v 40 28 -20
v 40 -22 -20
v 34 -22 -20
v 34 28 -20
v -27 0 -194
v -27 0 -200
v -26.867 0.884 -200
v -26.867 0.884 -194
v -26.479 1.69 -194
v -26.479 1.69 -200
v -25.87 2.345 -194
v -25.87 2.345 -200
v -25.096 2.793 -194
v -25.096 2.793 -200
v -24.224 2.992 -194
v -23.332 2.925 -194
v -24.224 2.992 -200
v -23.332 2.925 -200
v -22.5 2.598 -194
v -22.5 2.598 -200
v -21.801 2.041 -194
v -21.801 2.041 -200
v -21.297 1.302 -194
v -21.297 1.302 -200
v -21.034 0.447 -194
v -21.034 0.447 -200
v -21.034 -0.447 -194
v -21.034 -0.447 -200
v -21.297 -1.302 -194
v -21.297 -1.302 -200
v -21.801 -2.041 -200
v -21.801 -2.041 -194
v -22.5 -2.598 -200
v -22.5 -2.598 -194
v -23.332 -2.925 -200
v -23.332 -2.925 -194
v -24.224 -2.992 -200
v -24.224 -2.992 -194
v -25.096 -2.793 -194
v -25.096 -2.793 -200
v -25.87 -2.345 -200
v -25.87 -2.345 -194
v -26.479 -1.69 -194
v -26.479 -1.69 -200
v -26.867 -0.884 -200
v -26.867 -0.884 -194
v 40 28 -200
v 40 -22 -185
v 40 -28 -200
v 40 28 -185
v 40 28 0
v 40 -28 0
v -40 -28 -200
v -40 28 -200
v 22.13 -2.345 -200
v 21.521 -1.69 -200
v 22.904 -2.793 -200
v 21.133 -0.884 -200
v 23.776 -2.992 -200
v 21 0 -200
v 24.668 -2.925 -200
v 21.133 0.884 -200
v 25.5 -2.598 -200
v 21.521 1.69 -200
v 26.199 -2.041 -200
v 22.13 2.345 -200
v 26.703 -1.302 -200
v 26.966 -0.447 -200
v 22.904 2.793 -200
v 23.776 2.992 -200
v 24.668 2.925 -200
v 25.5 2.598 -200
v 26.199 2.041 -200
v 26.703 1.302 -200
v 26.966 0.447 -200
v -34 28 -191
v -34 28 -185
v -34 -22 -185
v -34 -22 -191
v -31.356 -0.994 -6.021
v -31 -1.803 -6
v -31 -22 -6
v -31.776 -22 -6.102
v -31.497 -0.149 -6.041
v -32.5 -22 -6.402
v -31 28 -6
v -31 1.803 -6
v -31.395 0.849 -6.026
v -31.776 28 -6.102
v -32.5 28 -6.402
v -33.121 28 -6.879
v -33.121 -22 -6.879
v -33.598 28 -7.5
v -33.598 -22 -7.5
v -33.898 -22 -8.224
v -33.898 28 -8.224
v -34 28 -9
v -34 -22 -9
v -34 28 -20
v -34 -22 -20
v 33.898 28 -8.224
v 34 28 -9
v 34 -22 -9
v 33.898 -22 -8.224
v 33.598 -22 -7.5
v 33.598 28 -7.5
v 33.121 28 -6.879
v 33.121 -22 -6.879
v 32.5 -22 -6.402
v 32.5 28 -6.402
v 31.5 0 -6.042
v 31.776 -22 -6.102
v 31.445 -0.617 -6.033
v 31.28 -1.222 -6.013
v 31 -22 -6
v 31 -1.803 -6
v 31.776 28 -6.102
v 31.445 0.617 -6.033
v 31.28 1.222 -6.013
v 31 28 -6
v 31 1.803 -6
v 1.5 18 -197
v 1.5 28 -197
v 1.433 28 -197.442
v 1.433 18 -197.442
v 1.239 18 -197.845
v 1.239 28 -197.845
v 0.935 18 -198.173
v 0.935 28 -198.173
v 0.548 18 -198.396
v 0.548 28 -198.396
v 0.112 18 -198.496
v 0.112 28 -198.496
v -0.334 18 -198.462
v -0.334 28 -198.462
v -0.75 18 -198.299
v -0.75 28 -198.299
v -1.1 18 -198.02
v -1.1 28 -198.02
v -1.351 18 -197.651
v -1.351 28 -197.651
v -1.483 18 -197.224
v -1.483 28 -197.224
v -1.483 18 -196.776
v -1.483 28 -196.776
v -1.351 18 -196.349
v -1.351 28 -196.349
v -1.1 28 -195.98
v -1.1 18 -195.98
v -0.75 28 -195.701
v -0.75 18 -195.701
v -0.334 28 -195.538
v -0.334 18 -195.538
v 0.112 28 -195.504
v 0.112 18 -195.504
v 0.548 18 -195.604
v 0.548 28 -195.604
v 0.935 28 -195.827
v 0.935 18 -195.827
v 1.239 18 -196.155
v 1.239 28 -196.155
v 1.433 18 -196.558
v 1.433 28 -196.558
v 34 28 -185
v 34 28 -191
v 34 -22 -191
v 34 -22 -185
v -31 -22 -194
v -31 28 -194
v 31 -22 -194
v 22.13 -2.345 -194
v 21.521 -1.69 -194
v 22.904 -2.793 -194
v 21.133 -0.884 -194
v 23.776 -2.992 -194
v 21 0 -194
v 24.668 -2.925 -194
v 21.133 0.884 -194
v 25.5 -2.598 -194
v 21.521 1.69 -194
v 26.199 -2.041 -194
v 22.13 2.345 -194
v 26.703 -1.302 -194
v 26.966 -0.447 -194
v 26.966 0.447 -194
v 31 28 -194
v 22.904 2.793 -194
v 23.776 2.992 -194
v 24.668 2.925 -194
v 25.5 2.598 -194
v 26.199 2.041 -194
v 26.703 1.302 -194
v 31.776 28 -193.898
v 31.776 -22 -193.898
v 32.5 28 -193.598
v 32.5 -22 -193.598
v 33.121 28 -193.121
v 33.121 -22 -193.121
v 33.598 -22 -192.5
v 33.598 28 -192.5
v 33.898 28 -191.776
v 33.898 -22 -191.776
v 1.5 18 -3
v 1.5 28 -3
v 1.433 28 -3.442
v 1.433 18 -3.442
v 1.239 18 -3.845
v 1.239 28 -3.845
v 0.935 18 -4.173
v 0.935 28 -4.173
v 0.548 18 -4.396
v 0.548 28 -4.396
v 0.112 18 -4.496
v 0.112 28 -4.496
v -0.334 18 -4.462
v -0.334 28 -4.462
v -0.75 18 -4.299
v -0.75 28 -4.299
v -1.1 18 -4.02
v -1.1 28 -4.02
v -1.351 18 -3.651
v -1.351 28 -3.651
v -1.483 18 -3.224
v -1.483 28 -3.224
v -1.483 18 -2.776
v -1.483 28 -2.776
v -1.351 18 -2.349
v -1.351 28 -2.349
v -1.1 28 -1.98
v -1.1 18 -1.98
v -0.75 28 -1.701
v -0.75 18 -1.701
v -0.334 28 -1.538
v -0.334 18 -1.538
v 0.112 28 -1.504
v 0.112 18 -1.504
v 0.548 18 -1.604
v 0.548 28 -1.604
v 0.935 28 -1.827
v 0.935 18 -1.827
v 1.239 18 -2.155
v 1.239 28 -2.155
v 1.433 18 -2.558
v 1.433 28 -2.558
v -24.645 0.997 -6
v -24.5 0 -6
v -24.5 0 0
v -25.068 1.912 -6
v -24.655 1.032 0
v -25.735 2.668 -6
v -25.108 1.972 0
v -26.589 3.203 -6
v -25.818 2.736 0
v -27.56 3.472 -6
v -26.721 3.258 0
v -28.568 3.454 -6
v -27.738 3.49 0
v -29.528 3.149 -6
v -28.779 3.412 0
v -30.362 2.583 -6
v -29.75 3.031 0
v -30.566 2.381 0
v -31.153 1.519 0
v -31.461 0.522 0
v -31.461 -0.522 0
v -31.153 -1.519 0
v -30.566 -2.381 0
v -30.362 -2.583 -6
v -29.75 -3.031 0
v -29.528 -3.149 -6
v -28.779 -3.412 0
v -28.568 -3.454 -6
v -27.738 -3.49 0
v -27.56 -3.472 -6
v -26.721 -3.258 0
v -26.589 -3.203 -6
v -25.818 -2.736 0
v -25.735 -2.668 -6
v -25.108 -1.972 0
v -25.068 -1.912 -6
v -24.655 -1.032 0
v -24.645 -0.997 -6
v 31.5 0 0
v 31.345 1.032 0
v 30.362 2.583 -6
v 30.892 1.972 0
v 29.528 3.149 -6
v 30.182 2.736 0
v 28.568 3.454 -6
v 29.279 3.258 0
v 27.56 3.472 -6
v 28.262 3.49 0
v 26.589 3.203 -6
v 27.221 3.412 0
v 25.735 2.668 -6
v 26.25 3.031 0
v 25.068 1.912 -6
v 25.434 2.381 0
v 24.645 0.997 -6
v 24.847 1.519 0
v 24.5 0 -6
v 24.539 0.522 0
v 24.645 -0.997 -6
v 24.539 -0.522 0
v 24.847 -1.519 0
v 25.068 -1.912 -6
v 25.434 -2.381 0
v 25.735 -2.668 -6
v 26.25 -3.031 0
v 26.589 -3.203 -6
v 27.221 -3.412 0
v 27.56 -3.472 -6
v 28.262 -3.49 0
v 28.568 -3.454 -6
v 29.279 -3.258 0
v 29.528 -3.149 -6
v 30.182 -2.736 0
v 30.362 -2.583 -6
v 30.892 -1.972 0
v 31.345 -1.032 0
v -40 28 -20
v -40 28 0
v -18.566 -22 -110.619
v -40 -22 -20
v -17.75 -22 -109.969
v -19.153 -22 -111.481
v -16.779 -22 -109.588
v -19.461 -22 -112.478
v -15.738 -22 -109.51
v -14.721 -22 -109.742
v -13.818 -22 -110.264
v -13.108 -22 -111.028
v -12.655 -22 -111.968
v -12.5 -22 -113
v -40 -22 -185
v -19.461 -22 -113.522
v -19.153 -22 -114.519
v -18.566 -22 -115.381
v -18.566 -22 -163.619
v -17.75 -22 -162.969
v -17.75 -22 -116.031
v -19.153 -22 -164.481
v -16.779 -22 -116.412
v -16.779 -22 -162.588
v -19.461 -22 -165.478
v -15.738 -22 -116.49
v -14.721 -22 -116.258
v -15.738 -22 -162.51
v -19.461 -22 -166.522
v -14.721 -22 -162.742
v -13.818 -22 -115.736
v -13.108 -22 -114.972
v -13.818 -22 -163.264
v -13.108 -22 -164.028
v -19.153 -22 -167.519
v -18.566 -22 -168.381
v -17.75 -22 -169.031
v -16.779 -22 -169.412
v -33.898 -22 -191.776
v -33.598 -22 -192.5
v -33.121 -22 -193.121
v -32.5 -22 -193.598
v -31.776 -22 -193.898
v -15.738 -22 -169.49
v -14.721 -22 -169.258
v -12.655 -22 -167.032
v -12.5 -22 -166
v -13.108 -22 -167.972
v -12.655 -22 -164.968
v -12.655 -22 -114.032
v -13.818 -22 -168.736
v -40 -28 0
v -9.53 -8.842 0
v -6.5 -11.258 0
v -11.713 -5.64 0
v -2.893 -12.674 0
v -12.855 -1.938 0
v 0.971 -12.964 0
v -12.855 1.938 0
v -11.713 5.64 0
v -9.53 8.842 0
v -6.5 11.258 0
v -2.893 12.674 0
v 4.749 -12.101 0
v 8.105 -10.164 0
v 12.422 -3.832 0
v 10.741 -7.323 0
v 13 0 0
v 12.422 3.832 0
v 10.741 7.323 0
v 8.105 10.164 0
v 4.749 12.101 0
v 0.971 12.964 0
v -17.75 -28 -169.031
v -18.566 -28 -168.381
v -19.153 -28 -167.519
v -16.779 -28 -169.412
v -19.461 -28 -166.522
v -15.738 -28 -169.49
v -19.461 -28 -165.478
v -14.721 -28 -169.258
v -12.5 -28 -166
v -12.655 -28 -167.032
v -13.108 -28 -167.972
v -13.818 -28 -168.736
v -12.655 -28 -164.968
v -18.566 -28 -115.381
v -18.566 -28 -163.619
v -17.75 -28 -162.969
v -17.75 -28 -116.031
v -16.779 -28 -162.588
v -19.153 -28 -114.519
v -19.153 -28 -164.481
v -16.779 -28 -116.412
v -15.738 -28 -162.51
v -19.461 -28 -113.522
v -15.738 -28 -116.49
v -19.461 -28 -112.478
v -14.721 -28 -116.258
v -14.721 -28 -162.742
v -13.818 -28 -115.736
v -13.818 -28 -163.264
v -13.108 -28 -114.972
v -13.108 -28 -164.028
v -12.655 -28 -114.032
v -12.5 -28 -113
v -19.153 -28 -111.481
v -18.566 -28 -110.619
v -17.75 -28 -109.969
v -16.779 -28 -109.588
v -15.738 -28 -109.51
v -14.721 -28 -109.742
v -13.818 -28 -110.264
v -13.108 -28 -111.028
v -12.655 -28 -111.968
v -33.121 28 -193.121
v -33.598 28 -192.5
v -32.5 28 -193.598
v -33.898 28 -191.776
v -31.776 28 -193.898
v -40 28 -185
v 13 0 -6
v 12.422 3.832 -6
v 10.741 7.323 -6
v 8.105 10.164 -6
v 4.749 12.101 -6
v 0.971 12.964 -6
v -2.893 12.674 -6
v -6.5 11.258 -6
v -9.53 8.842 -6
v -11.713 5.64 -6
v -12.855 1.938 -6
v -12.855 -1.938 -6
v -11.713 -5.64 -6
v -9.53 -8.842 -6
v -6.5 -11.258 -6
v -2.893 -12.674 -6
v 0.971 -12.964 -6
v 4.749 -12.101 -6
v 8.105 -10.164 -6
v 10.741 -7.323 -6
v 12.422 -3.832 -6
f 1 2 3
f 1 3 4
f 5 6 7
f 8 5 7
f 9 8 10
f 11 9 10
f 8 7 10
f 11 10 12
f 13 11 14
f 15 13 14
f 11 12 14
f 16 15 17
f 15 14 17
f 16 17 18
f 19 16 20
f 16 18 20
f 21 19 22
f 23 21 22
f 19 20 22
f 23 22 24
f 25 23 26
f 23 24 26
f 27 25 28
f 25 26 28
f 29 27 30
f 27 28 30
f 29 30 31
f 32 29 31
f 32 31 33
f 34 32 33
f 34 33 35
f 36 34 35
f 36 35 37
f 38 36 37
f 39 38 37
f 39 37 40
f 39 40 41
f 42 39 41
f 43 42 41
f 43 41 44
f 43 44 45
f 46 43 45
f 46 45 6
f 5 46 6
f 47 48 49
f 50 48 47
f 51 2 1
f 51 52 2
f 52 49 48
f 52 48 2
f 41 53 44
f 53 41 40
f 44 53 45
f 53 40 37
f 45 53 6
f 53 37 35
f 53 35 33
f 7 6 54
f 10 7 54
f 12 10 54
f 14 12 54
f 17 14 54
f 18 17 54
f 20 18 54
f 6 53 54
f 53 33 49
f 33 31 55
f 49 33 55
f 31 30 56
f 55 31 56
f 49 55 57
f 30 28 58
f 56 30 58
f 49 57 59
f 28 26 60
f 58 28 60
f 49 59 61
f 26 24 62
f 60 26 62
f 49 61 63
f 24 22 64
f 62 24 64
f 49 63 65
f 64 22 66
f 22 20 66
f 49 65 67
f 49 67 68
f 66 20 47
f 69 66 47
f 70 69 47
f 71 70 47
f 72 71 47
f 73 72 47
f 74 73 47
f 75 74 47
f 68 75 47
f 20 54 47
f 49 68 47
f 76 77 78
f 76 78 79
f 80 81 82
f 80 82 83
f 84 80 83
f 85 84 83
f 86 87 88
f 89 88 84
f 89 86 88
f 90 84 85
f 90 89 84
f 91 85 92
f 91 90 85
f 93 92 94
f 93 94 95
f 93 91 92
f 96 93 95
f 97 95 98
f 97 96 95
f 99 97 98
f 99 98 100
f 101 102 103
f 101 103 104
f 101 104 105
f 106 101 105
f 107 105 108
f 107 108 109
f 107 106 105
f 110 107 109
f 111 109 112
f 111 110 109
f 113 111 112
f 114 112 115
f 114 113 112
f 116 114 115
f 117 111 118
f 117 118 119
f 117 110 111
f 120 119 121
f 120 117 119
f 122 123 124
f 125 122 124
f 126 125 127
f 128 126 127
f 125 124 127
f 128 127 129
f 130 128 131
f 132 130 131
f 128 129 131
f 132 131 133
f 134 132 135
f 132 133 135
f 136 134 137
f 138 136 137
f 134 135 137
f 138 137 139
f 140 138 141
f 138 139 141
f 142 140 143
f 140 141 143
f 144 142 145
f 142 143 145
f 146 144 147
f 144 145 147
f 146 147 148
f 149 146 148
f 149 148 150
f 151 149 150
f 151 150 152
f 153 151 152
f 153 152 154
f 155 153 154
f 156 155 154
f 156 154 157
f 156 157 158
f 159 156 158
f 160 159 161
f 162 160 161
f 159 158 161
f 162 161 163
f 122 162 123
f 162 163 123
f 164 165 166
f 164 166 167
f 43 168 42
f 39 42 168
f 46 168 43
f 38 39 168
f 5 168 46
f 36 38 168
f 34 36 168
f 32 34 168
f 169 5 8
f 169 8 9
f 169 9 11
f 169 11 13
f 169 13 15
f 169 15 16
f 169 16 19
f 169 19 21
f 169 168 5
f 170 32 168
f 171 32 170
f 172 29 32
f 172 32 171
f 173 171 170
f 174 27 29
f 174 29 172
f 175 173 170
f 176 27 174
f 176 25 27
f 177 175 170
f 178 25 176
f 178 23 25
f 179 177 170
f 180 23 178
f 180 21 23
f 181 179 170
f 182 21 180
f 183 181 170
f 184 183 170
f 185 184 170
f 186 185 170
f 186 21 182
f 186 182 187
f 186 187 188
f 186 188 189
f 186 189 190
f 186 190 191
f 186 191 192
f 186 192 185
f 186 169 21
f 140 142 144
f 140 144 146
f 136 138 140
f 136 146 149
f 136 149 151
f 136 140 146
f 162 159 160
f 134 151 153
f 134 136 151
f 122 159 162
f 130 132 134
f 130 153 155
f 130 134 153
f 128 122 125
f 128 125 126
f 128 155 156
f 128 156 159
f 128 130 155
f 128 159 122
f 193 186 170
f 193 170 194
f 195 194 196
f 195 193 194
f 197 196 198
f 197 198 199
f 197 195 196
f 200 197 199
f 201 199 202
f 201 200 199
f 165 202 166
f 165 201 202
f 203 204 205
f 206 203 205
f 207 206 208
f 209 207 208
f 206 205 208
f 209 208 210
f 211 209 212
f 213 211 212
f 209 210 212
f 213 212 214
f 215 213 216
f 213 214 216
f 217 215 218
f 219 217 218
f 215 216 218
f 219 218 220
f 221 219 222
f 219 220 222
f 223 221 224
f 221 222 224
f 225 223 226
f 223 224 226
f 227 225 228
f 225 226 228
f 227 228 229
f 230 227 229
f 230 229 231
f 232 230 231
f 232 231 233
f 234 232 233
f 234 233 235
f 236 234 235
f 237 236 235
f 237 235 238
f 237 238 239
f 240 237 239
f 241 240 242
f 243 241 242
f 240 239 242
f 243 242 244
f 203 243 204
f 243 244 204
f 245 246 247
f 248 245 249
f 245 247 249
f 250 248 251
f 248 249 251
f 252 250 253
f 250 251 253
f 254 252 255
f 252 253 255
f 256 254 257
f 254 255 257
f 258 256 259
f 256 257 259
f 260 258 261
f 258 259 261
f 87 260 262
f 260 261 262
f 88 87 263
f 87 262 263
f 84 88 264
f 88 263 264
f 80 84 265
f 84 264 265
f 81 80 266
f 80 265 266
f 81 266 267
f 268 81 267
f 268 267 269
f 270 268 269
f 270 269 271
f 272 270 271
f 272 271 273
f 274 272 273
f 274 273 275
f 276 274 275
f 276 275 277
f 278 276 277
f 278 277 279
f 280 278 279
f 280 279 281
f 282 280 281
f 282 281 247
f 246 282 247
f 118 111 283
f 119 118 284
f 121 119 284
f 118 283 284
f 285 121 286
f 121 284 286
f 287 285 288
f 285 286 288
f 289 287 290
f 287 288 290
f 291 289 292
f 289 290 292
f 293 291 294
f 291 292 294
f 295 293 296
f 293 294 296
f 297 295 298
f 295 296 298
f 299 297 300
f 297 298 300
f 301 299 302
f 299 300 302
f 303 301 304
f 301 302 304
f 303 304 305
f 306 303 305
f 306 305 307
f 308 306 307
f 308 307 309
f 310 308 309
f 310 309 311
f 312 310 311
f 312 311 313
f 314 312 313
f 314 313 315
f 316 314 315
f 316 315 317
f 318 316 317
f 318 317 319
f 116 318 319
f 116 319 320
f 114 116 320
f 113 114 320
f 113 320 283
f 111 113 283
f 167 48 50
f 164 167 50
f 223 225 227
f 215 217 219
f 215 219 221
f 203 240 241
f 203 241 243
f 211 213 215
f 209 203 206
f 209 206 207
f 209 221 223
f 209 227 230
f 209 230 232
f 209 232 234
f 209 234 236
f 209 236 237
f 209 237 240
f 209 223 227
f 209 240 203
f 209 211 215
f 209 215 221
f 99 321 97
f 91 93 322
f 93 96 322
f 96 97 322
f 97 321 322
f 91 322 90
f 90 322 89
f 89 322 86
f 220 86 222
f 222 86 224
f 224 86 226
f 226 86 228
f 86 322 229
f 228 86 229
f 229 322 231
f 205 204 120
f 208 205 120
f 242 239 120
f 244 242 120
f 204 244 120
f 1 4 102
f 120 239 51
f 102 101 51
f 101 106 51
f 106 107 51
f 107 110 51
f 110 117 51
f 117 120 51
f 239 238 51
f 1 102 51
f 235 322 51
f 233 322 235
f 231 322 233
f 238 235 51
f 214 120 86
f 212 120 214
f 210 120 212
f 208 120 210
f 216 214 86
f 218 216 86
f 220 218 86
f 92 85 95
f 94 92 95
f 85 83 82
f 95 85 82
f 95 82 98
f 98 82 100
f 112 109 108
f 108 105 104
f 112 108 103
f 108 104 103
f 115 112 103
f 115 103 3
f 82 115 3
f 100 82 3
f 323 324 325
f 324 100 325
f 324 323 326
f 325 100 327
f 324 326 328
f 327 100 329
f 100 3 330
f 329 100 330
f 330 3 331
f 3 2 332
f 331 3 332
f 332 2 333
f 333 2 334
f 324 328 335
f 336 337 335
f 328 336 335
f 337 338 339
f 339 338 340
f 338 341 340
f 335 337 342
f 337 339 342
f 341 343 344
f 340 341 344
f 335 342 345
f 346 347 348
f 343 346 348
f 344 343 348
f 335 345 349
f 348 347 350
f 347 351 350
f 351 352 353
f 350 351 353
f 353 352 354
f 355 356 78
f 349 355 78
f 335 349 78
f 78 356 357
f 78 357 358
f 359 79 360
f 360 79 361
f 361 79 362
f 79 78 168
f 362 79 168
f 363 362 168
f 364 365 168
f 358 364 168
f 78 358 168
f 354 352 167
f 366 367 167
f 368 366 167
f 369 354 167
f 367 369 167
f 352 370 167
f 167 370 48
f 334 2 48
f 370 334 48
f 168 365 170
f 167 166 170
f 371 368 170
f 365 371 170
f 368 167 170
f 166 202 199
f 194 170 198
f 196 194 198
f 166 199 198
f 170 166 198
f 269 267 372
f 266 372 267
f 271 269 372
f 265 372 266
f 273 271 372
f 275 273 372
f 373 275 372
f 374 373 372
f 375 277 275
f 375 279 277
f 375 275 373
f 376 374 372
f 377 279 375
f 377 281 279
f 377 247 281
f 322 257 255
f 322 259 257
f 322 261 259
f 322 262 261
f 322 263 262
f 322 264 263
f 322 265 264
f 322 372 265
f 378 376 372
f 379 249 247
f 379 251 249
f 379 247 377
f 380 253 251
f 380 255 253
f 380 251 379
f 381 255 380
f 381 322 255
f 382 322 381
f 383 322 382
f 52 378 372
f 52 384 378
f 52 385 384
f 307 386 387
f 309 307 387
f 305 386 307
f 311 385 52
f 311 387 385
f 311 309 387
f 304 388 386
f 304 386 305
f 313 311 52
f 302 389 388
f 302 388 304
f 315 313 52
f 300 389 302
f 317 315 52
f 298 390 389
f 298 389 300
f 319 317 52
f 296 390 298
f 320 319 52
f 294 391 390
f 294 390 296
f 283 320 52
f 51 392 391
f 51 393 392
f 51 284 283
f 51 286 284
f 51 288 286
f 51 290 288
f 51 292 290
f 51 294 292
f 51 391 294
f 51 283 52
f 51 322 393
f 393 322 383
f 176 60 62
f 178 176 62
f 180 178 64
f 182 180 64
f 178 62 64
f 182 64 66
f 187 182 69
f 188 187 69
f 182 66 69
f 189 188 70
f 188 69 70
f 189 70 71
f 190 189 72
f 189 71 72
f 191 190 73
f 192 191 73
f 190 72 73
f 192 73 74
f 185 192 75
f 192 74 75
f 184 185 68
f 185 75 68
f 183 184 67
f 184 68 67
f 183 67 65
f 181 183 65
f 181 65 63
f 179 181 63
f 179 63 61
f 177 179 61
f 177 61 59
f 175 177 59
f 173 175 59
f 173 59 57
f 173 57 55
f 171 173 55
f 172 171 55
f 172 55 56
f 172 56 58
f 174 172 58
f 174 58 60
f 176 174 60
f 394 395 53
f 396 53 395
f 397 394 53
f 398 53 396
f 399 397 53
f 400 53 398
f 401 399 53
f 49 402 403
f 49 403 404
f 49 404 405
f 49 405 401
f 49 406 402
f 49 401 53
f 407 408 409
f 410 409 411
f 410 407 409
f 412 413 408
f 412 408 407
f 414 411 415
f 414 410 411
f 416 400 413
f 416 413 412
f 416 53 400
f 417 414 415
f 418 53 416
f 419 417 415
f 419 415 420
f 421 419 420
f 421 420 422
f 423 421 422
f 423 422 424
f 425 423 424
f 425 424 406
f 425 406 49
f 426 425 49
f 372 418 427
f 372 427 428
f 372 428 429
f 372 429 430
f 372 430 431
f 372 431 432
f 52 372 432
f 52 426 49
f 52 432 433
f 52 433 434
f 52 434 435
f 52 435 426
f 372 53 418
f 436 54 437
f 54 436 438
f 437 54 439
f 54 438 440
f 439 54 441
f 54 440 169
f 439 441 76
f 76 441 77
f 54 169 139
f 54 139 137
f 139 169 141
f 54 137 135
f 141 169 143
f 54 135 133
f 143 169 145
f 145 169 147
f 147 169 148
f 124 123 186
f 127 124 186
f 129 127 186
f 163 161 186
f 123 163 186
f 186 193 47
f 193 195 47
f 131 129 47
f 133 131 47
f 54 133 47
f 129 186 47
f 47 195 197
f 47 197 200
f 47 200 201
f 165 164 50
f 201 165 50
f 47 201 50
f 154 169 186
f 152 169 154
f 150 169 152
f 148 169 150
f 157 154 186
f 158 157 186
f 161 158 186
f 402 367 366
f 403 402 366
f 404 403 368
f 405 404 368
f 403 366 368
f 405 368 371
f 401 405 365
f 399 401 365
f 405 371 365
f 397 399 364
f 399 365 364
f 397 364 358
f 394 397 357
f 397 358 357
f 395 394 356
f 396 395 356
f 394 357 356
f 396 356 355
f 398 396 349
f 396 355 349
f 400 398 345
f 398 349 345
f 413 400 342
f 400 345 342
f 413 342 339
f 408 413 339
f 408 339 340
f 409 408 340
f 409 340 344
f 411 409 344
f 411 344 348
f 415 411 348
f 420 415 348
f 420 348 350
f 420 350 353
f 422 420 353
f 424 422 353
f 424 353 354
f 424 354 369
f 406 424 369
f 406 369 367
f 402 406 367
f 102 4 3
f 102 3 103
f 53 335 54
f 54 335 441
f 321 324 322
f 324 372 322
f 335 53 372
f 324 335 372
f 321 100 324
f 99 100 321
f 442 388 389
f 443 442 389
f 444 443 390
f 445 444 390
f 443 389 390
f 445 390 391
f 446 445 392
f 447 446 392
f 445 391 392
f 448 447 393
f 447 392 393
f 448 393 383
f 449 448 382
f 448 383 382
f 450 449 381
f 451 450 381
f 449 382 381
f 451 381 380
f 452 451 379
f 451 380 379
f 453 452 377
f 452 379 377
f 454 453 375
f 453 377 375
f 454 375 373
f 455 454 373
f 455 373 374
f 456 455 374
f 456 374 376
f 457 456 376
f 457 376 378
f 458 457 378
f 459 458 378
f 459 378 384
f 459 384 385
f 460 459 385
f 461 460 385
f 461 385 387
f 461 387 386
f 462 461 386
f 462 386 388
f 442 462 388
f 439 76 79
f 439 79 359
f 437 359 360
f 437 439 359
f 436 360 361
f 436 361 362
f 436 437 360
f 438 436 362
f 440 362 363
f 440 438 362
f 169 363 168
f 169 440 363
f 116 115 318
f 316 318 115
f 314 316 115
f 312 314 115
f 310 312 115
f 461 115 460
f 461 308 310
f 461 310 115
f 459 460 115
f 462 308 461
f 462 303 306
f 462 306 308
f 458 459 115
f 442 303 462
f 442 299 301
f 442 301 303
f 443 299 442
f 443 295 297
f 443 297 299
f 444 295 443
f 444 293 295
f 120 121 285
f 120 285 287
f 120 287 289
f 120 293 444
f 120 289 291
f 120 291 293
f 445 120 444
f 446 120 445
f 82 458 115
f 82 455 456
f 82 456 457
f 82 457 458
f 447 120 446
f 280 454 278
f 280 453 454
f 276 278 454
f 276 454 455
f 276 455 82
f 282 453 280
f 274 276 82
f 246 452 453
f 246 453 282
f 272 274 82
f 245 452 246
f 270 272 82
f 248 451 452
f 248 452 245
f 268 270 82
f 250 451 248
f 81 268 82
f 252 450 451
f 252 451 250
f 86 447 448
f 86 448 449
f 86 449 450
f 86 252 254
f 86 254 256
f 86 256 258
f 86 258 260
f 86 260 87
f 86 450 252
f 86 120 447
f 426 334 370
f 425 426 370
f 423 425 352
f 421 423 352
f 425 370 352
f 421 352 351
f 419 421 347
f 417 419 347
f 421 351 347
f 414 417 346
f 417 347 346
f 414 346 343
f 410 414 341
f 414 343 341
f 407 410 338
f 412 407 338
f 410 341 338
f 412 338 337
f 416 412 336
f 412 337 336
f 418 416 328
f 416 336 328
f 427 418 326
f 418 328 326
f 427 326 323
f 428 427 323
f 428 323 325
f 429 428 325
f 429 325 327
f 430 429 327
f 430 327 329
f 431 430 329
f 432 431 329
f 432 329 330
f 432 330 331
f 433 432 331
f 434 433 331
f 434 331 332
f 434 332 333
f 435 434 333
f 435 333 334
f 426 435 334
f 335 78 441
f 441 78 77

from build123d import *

# Parameters (mm, degrees)
SKETCH_1_W          = 80
SKETCH_1_H          = 56
EXTRUDE_1_DEPTH     = 200
CUT_EXTRUDE_1_DEPTH = 50
SKETCH_3_R          = 3.5
SKETCH_3_R_2        = 13
CUT_EXTRUDE_2_DEPTH = 10
SKETCH_4_R          = 2
SKETCH_4_W          = 27
SKETCH_4_H          = 36
CUT_EXTRUDE_3_DEPTH = 10
SKETCH_5_R          = 3
CUT_EXTRUDE_4_DEPTH = 10
SKETCH_6_R          = 3.500000002
SKETCH_6_R_2        = 3.5
CUT_EXTRUDE_5_DEPTH = 10
SKETCH_7_R          = 1.5
CUT_EXTRUDE_6_DEPTH = 10
SKETCH_8_W          = 165
SKETCH_8_H          = 50
CUT_EXTRUDE_7_DEPTH = 81


with BuildPart() as part:
    # 草图1 → 凸台-拉伸1 (new body)
    with BuildSketch(Plane.XY):
        Rectangle(SKETCH_1_W, SKETCH_1_H)
    extrude(amount=-EXTRUDE_1_DEPTH)

    # 草图2 → 切除-拉伸1 (cut)
    with BuildSketch(Plane(origin=(0, 28, 0), x_dir=(1, 0, 0), z_dir=(0, 1, 0))):
        with BuildLine():
            ThreePointArc((-34, 191), (-33.121320344, 193.121320344), (-31, 194))
            Line((-31, 194), (31, 194))
            ThreePointArc((31, 194), (33.121320344, 193.121320344), (34, 191))
            Line((34, 191), (34, 9))
            ThreePointArc((34, 9), (33.121320344, 6.878679656), (31, 6))
            Line((31, 6), (-31, 6))
            ThreePointArc((-31, 6), (-33.121320344, 6.878679656), (-34, 9))
            Line((-34, 9), (-34, 191))
        make_face()
    extrude(amount=-CUT_EXTRUDE_1_DEPTH, mode=Mode.SUBTRACT)

    # 草图3 → 切除-拉伸2 (cut)
    with BuildSketch(Plane.XY):
        with Locations((-28, 0)):
            Circle(SKETCH_3_R)
        Circle(SKETCH_3_R_2)
        with Locations((28, 0)):
            Circle(SKETCH_3_R)
    extrude(amount=-CUT_EXTRUDE_2_DEPTH, mode=Mode.SUBTRACT)

    # 草图4 → 切除-拉伸3 (cut)
    with BuildSketch(Plane.ZY.offset(40)):
        with Locations((-121.5, -5)):
            Circle(SKETCH_4_R)
        with Locations((-121.5, 19)):
            Circle(SKETCH_4_R)
        with Locations((-158.5, 19)):
            Circle(SKETCH_4_R)
        with Locations((-158.5, -5)):
            Circle(SKETCH_4_R)
        with Locations((-140, 7)):
            Rectangle(SKETCH_4_W, SKETCH_4_H)
    extrude(amount=-CUT_EXTRUDE_3_DEPTH, mode=Mode.SUBTRACT)

    # 草图5 → 切除-拉伸4 (cut)
    with BuildSketch(Plane(origin=(0, 0, -200), x_dir=(-1, 0, 0), z_dir=(0, 0, -1))):
        with Locations((24, 0)):
            Circle(SKETCH_5_R)
        with Locations((-24, 0)):
            Circle(SKETCH_5_R)
    extrude(amount=-CUT_EXTRUDE_4_DEPTH, mode=Mode.SUBTRACT)

    # 草图6 → 切除-拉伸5 (cut)
    with BuildSketch(Plane(origin=(0, -22, 0), x_dir=(1, 0, 0), z_dir=(0, 1, 0))):
        with Locations((-16, 166)):
            Circle(SKETCH_6_R)
        with Locations((-16, 113)):
            Circle(SKETCH_6_R_2)
    extrude(amount=-CUT_EXTRUDE_5_DEPTH, mode=Mode.SUBTRACT)

    # 草图7 → 切除-拉伸6 (cut)
    with BuildSketch(Plane(origin=(0, 28, 0), x_dir=(1, 0, 0), z_dir=(0, 1, 0))):
        with Locations((-37, 150)):
            Circle(SKETCH_7_R)
        with Locations((-37, 50)):
            Circle(SKETCH_7_R)
        with Locations((37, 50)):
            Circle(SKETCH_7_R)
        with Locations((37, 150)):
            Circle(SKETCH_7_R)
        with Locations((0, 197)):
            Circle(SKETCH_7_R)
        with Locations((0, 3)):
            Circle(SKETCH_7_R)
    extrude(amount=-CUT_EXTRUDE_6_DEPTH, mode=Mode.SUBTRACT)

    # 草图8 → 切除-拉伸7 (cut, through all)
    with BuildSketch(Plane(origin=(40, 0, 0), x_dir=(0, 0, -1), z_dir=(1, 0, 0))):
        with Locations((102.5, 3)):
            Rectangle(SKETCH_8_W, SKETCH_8_H)
    extrude(amount=-CUT_EXTRUDE_7_DEPTH, mode=Mode.SUBTRACT)


solid = part.part
